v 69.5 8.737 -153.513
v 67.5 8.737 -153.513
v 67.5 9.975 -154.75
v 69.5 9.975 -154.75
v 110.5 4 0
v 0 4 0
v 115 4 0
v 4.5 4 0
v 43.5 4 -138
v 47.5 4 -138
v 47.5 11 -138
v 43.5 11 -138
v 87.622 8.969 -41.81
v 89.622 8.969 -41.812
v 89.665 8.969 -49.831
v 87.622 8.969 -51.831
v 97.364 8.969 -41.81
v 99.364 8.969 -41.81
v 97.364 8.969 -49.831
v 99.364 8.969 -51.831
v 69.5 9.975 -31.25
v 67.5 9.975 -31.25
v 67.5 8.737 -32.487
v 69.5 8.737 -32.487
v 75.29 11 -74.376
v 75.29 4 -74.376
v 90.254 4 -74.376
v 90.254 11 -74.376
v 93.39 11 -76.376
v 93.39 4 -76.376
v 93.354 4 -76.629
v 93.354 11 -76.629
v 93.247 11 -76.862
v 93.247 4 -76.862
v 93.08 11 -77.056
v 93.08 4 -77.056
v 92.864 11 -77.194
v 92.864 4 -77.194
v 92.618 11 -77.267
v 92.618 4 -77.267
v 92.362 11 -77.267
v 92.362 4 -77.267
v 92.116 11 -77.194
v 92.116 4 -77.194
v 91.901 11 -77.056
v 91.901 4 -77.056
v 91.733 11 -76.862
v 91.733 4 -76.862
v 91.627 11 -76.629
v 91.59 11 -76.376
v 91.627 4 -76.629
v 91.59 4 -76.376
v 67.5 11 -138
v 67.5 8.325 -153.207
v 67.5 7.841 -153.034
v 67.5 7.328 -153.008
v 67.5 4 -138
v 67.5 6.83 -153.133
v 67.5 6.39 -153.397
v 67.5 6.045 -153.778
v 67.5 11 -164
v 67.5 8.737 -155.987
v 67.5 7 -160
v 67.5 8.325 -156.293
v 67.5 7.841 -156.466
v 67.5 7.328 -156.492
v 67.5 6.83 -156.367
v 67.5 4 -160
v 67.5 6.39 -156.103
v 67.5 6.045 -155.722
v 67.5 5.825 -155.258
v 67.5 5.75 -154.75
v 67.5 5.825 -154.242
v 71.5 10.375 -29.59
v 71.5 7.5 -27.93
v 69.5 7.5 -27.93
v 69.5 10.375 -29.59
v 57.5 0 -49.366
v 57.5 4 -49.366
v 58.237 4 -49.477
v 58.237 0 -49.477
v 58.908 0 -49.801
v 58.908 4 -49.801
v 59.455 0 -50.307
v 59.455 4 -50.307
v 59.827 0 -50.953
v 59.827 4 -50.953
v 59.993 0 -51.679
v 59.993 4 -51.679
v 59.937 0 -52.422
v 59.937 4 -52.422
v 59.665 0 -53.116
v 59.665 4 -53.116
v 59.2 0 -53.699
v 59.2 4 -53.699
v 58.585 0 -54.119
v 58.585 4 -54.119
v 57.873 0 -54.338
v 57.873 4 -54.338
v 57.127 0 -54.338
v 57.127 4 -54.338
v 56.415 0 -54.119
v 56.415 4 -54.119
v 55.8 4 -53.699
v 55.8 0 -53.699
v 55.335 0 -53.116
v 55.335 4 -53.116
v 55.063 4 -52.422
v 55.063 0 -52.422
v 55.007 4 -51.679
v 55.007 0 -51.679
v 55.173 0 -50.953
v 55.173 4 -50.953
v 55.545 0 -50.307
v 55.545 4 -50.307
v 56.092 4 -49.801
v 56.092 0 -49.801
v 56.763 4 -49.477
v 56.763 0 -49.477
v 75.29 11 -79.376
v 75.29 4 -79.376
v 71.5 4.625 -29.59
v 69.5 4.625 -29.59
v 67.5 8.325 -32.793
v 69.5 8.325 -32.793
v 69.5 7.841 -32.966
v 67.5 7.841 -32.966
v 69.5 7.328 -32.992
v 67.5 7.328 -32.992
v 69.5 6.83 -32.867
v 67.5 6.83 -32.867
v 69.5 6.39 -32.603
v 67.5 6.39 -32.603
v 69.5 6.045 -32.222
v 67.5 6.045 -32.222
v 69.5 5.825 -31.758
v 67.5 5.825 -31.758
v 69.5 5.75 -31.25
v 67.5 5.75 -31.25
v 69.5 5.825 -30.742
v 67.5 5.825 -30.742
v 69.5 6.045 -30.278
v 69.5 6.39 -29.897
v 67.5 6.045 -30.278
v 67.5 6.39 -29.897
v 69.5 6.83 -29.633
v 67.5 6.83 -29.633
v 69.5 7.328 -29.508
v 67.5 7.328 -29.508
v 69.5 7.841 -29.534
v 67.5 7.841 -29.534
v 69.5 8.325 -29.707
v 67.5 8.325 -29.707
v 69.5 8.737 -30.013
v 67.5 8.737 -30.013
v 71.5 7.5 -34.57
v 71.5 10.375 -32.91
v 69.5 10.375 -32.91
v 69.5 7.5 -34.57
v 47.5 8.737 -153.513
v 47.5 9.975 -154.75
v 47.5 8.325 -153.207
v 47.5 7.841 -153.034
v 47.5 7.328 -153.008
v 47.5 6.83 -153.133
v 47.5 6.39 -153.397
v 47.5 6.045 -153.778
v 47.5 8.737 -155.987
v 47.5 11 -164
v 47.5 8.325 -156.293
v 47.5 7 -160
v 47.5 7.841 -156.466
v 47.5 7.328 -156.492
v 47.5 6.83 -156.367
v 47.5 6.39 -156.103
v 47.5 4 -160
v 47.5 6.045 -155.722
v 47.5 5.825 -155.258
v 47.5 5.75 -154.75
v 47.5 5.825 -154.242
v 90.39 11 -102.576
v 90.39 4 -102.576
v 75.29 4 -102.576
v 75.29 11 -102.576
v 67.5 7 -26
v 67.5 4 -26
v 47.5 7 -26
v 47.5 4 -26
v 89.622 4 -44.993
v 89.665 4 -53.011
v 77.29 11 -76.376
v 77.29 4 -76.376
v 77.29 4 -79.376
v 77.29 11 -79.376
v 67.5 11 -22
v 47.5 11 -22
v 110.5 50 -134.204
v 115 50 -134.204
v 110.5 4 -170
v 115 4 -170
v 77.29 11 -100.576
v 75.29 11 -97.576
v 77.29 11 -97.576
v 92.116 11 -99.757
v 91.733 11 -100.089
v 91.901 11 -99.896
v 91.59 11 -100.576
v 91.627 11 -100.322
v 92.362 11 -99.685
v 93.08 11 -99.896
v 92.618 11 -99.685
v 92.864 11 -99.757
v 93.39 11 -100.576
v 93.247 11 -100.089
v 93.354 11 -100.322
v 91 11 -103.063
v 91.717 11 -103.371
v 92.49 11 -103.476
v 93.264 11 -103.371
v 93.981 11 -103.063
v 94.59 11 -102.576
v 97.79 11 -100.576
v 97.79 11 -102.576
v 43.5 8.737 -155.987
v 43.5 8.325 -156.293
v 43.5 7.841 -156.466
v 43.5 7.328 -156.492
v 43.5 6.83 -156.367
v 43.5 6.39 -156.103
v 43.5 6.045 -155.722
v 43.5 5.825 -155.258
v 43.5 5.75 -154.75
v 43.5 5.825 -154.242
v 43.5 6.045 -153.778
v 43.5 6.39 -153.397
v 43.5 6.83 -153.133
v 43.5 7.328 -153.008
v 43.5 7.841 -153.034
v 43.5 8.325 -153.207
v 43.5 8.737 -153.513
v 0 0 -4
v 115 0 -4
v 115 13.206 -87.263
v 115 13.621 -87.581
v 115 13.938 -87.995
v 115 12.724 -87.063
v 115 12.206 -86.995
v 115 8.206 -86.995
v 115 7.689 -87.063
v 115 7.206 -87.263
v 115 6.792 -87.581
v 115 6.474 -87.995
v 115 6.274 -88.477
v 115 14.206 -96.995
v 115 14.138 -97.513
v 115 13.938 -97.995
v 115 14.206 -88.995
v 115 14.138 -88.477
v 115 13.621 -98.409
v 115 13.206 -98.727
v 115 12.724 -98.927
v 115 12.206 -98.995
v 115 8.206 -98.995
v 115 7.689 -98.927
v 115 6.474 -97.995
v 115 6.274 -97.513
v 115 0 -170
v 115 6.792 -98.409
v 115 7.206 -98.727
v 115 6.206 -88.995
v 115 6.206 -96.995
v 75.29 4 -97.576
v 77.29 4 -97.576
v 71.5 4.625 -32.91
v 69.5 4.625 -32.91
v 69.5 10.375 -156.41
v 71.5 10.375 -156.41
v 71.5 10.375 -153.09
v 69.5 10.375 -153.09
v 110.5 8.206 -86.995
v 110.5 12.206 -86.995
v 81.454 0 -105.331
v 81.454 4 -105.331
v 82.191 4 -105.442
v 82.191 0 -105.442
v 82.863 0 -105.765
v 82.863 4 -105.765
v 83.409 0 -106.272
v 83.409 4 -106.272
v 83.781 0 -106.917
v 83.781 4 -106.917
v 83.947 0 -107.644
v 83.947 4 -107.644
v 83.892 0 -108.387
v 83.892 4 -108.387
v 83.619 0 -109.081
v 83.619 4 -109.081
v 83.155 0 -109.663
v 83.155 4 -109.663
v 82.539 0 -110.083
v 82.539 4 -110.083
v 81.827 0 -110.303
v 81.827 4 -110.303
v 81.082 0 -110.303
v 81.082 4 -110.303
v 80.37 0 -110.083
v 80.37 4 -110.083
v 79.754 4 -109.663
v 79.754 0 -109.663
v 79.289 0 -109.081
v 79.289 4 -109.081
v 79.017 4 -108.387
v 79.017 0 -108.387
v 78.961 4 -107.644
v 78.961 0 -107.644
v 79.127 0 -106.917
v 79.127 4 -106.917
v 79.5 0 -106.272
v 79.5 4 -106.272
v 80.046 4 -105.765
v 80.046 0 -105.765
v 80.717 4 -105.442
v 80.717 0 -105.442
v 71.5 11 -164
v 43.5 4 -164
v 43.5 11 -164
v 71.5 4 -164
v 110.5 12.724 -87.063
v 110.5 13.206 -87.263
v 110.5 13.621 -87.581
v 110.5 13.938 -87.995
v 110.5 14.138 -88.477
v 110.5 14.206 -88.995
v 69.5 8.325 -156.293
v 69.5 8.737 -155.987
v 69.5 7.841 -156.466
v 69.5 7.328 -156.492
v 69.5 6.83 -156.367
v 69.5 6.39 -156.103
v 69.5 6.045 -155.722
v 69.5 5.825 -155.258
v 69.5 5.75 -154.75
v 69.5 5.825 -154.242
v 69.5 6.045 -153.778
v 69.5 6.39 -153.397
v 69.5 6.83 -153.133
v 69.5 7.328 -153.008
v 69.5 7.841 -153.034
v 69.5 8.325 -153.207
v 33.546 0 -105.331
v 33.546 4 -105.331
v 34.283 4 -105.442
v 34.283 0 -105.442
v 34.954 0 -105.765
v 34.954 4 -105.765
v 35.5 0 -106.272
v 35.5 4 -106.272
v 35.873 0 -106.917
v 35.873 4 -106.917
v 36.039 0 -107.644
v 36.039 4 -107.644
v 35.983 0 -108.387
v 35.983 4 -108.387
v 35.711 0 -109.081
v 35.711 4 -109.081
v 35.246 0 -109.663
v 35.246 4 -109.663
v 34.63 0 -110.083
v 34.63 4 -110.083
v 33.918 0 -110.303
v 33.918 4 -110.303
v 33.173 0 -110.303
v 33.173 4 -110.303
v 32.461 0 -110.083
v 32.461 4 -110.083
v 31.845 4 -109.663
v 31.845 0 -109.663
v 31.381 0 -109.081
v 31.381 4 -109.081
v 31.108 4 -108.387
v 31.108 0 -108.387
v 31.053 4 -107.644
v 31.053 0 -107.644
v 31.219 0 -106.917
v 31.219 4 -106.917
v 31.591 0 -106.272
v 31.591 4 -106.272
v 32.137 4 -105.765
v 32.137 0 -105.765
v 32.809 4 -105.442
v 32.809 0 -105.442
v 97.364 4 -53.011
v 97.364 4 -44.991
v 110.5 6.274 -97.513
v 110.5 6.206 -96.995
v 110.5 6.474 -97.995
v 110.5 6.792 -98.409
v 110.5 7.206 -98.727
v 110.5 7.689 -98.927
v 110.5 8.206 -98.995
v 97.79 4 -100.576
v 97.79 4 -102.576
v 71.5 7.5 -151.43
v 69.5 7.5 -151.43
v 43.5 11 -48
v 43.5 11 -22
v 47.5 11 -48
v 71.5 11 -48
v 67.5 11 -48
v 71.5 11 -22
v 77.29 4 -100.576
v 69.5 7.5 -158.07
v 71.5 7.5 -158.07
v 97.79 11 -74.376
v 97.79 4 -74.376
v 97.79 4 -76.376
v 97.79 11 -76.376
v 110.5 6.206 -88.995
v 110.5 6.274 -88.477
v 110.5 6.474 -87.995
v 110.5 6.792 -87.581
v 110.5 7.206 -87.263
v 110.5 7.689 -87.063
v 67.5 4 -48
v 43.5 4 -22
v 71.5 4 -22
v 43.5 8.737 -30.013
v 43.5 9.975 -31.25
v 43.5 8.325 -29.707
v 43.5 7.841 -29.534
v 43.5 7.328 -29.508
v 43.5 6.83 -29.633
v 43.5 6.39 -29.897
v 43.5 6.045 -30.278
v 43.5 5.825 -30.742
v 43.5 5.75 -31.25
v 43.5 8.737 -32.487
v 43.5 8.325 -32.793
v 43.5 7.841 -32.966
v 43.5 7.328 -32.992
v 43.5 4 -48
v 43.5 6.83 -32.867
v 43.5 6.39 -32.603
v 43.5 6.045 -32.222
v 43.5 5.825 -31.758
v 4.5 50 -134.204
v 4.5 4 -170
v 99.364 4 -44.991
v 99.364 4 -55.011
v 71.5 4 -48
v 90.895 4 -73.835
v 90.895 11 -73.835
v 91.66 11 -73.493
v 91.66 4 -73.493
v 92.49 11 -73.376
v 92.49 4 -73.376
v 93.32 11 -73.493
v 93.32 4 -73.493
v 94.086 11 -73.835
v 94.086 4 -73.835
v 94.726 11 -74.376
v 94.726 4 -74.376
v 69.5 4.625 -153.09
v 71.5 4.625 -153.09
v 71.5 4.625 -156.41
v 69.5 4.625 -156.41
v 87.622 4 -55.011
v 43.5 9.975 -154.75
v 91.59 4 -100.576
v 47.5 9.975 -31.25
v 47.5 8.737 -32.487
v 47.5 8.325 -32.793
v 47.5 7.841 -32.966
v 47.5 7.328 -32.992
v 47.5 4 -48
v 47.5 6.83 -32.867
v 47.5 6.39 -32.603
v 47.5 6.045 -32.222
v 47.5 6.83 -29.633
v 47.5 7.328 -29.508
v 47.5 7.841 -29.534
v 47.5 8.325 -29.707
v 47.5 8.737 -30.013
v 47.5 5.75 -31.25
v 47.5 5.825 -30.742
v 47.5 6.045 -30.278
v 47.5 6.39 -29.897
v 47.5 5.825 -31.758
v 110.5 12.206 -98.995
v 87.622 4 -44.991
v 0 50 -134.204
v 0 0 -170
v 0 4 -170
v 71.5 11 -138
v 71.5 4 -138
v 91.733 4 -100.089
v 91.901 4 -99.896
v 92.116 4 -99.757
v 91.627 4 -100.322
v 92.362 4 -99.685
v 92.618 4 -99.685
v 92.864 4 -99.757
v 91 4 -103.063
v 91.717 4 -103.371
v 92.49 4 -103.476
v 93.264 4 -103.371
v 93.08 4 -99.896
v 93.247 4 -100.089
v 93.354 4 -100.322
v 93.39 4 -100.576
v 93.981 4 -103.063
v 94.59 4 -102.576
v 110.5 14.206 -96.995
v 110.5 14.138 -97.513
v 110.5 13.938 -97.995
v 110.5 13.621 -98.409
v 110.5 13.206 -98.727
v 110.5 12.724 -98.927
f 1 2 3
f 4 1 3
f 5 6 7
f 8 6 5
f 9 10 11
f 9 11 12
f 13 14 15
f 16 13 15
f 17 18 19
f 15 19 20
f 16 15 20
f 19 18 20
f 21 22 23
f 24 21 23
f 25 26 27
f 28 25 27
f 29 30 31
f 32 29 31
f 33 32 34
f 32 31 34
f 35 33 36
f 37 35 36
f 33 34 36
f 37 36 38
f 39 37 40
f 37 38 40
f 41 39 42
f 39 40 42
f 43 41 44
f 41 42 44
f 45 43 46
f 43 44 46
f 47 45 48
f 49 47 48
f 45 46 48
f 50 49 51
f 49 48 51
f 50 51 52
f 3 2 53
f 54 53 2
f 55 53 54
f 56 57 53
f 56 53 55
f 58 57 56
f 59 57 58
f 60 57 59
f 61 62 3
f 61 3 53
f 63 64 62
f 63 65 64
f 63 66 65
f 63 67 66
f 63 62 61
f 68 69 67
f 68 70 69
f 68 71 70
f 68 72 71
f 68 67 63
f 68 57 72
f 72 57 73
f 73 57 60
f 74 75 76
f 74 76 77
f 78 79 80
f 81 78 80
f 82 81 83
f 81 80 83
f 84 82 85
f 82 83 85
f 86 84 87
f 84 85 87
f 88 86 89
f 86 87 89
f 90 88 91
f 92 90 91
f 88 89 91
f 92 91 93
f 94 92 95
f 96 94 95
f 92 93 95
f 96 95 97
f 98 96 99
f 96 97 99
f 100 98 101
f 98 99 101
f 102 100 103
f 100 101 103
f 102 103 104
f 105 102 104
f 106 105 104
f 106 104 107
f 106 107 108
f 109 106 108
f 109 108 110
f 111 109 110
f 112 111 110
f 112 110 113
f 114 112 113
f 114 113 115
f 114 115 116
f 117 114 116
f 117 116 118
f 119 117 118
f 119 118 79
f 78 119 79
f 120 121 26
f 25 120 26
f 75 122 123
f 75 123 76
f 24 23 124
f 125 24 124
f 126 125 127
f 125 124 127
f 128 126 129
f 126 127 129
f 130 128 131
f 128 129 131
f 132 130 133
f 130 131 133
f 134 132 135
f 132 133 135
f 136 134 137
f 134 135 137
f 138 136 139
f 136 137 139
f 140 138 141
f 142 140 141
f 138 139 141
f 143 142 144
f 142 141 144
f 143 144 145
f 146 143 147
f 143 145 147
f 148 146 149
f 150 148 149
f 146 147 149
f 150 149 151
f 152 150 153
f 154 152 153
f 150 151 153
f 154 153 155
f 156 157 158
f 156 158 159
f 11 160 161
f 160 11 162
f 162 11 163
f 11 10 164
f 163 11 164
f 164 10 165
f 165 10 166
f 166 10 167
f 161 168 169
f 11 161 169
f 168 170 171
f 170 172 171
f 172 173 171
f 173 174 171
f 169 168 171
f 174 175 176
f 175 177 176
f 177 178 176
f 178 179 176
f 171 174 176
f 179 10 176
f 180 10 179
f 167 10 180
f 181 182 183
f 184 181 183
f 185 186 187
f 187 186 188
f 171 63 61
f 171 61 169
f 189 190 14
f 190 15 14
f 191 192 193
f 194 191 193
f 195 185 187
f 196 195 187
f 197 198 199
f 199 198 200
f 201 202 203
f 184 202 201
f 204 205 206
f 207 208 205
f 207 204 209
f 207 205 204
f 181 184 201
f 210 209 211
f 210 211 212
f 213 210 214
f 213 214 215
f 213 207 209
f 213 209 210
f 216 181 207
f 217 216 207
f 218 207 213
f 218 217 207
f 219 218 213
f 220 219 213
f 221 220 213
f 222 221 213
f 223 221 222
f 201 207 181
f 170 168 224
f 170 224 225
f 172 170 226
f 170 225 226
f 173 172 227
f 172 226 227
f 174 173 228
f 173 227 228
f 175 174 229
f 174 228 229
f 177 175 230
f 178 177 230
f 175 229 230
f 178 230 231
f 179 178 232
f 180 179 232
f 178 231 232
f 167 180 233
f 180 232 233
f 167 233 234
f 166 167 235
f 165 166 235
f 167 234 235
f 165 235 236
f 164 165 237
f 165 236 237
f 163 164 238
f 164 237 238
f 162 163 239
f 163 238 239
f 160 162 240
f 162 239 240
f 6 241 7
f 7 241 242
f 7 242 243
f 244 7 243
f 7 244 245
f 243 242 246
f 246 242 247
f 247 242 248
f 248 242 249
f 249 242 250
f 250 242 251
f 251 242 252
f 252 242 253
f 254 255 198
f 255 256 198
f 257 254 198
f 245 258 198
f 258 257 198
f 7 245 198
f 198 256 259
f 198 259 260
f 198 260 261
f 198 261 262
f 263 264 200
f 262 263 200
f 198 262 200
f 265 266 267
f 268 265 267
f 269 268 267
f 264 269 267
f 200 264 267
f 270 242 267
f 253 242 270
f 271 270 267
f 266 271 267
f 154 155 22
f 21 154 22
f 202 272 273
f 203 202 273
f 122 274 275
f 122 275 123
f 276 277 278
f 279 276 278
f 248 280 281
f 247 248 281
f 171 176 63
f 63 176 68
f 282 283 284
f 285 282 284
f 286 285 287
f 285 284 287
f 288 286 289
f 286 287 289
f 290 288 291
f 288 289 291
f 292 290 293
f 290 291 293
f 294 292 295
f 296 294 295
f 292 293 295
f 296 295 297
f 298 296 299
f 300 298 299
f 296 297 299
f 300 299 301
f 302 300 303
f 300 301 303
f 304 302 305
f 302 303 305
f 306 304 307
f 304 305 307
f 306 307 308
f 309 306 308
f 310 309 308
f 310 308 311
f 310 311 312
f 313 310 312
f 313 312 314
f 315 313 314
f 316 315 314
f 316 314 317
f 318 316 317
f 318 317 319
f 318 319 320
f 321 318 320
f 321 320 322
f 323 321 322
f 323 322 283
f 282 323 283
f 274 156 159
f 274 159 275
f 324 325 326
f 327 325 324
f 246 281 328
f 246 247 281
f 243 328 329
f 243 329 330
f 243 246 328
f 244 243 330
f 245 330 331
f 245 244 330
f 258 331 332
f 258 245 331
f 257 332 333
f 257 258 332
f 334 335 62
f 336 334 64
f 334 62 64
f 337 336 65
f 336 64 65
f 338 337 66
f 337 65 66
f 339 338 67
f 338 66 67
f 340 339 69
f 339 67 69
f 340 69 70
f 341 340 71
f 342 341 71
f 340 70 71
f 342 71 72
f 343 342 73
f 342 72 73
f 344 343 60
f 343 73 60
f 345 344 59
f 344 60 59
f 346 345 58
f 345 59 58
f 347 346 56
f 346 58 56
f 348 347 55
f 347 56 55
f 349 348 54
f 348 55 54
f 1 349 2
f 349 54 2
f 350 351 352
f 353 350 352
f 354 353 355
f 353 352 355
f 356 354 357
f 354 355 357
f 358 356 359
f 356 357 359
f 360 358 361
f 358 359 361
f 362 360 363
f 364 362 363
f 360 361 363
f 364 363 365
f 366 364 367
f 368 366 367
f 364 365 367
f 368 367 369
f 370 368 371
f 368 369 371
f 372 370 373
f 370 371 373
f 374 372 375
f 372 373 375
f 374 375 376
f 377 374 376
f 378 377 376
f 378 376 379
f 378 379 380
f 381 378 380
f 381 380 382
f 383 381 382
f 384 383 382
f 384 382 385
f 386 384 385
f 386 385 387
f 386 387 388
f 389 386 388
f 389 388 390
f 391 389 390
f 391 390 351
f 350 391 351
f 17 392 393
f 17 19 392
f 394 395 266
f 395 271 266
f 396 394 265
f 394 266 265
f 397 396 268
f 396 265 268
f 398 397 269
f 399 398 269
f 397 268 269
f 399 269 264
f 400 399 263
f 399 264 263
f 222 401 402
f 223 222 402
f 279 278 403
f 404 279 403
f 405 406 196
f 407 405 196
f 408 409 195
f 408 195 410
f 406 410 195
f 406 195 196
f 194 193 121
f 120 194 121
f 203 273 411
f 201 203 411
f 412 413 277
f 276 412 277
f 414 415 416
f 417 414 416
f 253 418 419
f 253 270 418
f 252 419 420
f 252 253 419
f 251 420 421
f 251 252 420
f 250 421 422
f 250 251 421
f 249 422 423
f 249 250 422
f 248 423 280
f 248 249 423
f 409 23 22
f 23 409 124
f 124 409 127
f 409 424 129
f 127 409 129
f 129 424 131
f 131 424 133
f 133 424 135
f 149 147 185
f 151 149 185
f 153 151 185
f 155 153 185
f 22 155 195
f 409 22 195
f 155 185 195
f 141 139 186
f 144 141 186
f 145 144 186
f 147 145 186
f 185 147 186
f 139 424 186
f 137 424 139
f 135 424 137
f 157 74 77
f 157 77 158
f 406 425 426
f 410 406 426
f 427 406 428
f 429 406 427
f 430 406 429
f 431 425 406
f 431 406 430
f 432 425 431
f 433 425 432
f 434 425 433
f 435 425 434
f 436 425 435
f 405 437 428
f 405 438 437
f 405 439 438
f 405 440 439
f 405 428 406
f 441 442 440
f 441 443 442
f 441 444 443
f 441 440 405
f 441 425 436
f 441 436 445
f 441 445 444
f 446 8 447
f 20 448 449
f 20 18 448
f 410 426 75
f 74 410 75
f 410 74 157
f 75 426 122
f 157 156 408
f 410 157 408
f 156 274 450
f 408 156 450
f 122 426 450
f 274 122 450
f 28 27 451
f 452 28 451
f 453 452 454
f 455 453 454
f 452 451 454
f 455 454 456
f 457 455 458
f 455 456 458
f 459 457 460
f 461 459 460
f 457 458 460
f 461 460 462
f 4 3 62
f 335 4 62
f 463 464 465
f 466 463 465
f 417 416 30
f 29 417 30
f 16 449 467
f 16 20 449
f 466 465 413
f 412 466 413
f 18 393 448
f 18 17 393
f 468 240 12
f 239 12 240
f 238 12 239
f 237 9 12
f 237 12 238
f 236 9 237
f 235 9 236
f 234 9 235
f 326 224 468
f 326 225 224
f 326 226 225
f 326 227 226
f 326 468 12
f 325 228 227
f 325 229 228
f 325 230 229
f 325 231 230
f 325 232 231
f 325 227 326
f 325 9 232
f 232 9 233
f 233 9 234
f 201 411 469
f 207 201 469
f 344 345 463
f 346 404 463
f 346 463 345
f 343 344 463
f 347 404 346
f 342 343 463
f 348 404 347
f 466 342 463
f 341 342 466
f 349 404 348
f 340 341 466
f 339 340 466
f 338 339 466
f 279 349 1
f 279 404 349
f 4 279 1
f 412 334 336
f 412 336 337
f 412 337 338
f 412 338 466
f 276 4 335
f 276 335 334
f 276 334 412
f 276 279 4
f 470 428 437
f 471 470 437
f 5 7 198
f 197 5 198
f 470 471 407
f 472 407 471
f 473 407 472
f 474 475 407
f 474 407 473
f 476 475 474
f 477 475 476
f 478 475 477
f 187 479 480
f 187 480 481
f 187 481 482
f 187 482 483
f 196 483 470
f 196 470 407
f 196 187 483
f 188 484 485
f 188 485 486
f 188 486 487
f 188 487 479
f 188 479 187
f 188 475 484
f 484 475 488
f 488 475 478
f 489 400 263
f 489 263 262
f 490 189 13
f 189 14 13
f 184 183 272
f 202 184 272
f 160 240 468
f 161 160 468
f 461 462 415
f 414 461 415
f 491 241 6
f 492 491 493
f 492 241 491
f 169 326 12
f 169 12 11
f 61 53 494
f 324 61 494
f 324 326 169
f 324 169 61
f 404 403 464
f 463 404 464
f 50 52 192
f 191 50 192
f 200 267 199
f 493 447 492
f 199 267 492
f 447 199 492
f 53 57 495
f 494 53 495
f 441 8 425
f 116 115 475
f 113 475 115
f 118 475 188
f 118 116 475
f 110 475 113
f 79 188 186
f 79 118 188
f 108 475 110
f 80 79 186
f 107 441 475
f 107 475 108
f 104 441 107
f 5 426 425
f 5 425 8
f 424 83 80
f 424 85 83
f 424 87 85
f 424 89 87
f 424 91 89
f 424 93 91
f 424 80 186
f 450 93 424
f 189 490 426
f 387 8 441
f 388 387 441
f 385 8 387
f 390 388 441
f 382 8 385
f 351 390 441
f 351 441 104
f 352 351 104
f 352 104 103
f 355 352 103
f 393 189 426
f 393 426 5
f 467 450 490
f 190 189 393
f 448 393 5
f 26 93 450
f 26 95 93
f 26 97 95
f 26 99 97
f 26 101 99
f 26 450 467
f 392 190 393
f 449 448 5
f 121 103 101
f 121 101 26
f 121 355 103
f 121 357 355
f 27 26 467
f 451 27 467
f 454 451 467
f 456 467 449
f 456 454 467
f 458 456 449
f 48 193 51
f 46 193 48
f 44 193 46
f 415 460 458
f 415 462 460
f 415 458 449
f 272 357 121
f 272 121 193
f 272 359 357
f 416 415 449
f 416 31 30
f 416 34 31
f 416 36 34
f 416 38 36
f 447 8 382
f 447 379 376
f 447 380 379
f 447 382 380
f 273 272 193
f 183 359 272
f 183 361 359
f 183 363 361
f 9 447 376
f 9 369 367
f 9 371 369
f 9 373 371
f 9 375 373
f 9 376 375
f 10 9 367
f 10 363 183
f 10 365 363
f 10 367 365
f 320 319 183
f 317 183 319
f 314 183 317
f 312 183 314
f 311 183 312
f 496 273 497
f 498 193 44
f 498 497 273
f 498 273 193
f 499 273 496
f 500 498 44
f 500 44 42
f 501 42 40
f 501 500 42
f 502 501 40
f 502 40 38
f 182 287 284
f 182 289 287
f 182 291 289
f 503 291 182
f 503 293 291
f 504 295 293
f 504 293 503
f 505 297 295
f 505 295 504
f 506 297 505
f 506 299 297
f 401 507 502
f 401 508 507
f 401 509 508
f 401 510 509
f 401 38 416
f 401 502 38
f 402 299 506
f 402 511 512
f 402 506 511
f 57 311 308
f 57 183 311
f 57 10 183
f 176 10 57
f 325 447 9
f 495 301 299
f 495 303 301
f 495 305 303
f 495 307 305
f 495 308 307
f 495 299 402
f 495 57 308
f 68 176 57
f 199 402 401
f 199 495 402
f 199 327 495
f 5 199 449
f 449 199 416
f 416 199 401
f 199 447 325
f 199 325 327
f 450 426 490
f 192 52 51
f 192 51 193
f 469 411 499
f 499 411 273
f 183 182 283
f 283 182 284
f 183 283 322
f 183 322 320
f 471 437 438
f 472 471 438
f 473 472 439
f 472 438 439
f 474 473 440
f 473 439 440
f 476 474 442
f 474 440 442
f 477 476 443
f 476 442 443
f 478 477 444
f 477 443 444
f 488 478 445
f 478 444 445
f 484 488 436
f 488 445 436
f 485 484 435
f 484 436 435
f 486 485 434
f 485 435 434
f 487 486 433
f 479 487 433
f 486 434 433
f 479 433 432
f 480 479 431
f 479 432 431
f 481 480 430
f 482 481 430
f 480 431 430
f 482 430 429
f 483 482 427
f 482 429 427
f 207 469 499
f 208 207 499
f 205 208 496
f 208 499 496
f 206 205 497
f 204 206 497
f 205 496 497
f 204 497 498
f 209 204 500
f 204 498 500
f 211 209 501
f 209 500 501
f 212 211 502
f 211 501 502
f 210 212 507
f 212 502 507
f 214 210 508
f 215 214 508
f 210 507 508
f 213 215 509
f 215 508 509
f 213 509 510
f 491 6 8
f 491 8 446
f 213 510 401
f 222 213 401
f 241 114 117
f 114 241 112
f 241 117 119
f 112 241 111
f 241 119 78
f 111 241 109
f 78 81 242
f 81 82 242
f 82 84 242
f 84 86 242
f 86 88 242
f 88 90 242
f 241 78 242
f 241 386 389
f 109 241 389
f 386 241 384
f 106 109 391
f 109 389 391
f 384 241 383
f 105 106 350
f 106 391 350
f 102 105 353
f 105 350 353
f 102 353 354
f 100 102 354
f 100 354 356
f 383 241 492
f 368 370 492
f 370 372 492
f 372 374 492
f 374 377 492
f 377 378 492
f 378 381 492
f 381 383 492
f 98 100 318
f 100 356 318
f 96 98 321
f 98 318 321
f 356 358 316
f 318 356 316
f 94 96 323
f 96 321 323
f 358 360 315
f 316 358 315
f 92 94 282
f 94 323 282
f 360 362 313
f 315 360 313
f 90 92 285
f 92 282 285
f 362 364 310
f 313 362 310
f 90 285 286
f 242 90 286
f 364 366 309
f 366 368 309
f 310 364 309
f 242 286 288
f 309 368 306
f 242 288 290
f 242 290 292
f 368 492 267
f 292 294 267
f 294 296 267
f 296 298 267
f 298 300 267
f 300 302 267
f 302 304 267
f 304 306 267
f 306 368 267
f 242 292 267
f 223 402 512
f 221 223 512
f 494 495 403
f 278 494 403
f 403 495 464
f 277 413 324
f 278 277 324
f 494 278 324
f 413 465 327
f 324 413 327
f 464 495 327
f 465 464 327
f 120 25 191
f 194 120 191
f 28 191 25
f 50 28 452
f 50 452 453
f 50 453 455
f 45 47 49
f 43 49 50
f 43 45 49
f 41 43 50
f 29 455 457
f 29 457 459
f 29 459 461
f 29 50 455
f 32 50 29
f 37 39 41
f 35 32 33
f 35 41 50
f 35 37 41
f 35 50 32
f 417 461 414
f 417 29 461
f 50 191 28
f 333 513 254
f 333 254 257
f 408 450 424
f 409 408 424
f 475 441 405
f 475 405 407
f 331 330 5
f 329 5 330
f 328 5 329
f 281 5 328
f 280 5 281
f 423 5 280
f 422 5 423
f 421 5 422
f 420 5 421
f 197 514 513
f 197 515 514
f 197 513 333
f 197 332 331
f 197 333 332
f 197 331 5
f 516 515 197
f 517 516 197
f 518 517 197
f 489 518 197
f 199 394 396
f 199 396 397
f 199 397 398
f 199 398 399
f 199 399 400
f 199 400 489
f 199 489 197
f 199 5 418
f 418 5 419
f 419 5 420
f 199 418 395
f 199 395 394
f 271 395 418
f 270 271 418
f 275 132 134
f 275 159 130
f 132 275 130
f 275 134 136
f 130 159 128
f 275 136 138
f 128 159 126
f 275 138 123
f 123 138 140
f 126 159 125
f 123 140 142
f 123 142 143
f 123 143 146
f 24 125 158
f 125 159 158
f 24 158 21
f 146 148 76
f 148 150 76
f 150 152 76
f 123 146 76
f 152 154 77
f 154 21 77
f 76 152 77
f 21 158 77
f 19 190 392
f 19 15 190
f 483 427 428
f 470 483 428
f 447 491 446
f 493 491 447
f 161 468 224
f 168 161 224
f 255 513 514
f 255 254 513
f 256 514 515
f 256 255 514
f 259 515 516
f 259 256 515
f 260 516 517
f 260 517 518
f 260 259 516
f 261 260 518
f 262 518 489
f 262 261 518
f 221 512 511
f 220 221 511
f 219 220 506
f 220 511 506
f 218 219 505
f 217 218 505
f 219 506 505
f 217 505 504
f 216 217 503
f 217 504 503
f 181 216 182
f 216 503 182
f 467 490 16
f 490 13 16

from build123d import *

# Parameters (mm, degrees)
SKETCH1_W                  = 110.5
SKETCH1_H                  = 170
SKETCH1_W_2                = 4.5
BOSS_EXTRUDE1_DEPTH        = 4
SKETCH1_4_W                = 4.5
SKETCH1_4_H                = 170
BOSS_EXTRUDE2_DEPTH        = 50
CUT_EXTRUDE1_DEPTH         = 4.5
SALIENTE_EXTRUIR1_DEPTH    = 7
SALIENTE_EXTRUIR2_DEPTH    = 7
CORTAR_EXTRUIR1_DEPTH      = 31
CORTAR_EXTRUIR1_DEPTH_BACK = 7
CORTAR_EXTRUIR2_DEPTH      = 2
CHAFL_N1_SIZE              = 4
CHAFL_N2_SIZE              = 4
CROQUIS5_R                 = 2.5
CORTAR_EXTRUIR3_DEPTH      = 23.7
CHAFL_N3_SIZE              = 4
SALIENTE_EXTRUIR4_DEPTH    = 7
CROQUIS8_W                 = 12
CROQUIS8_H                 = 8
CORTAR_EXTRUIR4_DEPTH      = 7
REDONDEO1_R                = 2


with BuildPart() as part:
    # Sketch1 → Boss-Extrude1 (new body)
    with BuildSketch(Plane(origin=(0, 0, 0), x_dir=(1, 0, 0), z_dir=(0, 1, 0))):
        with Locations((59.75, 85)):
            Rectangle(SKETCH1_W, SKETCH1_H)
        with Locations((2.25, 85)):
            Rectangle(SKETCH1_W_2, SKETCH1_H)
    extrude(amount=BOSS_EXTRUDE1_DEPTH)

    # Sketch1<4> → Boss-Extrude2 (add)
    with BuildSketch(Plane(origin=(0, 0, 0), x_dir=(1, 0, 0), z_dir=(0, 1, 0))):
        with Locations((2.25, 85)):
            Rectangle(SKETCH1_4_W, SKETCH1_4_H)
    boss_extrude2 = extrude(amount=BOSS_EXTRUDE2_DEPTH)

    # Sketch2 → Cut-Extrude1 (cut)
    with BuildSketch(Plane.ZY):
        Polygon((-134.204014838, 50), (-170, 4), (-182.392562203, 4), (-182.392562203, 57.402643918), (5.745866014, 57.402643918), (5.745866014, 4), (0, 4), align=None)
    cut_extrude1 = extrude(amount=-CUT_EXTRUDE1_DEPTH, mode=Mode.SUBTRACT)

    # Mirror1: Boss-Extrude2, Cut-Extrude1 across plane
    add(boss_extrude2.mirror(Plane(origin=(57.5, 0, 0), x_dir=(0, 0, 1), z_dir=(1, 0, 0))))
    add(cut_extrude1.mirror(Plane(origin=(57.5, 0, 0), x_dir=(0, 0, 1), z_dir=(1, 0, 0))), mode=Mode.SUBTRACT)

    # Sketch3 → Saliente-Extruir1 (add)
    with BuildSketch(Plane(origin=(0, 4, 0), x_dir=(1, 0, 0), z_dir=(0, 1, 0))):
        Polygon((57.5, 160), (47.5, 160), (47.5, 142), (47.5, 138), (43.5, 138), (43.5, 164), (57.5, 164), align=None)
    saliente_extruir1 = extrude(amount=SALIENTE_EXTRUIR1_DEPTH)

    # Croquis1 → Saliente-Extruir2 (add)
    with BuildSketch(Plane(origin=(0, 4, 0), x_dir=(1, 0, 0), z_dir=(0, 1, 0))):
        Polygon((57.5, 26), (57.5, 22), (43.5, 22), (43.5, 48), (47.5, 48), (47.5, 26), align=None)
    saliente_extruir2 = extrude(amount=SALIENTE_EXTRUIR2_DEPTH)

    # Simetría1: Saliente-Extruir1, Saliente-Extruir2 across plane
    add(saliente_extruir1.mirror(Plane(origin=(57.5, 11, -164), x_dir=(0, 0, 1), z_dir=(-1, 0, 0))))
    add(saliente_extruir2.mirror(Plane(origin=(57.5, 11, -164), x_dir=(0, 0, 1), z_dir=(-1, 0, 0))))

    # Croquis2 → Cortar-Extruir1 (cut, two sides: drawn at the far end of the back side and taken through both)
    with BuildSketch(Plane(origin=(47.5, 0, 0), x_dir=(0, 0, -1), z_dir=(1, 0, 0)).offset(-CORTAR_EXTRUIR1_DEPTH_BACK)):
        with BuildLine():
            Line((31.25, 9.974873734), (32.487436867, 8.737436867))
            ThreePointArc((32.487436867, 8.737436867), (31.25, 5.75), (30.012563133, 8.737436867))
            Line((30.012563133, 8.737436867), (31.25, 9.974873734))
        make_face()
        with BuildLine():
            Line((154.75, 9.974873734), (155.987436867, 8.737436867))
            ThreePointArc((155.987436867, 8.737436867), (154.75, 5.75), (153.512563133, 8.737436867))
            Line((153.512563133, 8.737436867), (154.75, 9.974873734))
        make_face()
    extrude(amount=CORTAR_EXTRUIR1_DEPTH + CORTAR_EXTRUIR1_DEPTH_BACK, mode=Mode.SUBTRACT)

    # Croquis4 → Cortar-Extruir2 (cut)
    with BuildSketch(Plane(origin=(71.5, 0, 0), x_dir=(0, 0, -1), z_dir=(1, 0, 0))):
        Polygon((158.069764048, 7.5), (156.409882024, 10.375), (153.090117976, 10.375), (151.430235952, 7.5), (153.090117976, 4.625), (156.409882024, 4.625), align=None)
        Polygon((29.590117976, 4.625), (27.930235952, 7.5), (29.590117976, 10.375), (32.909882024, 10.375), (34.569764048, 7.5), (32.909882024, 4.625), align=None)
    extrude(amount=-CORTAR_EXTRUIR2_DEPTH, mode=Mode.SUBTRACT)

    # Chaflán1
    chafl_n1_edges = [part.edges().sort_by_distance(p)[0] for p in [
        (57.5, 11, -26),
    ]]
    chamfer(chafl_n1_edges, length=CHAFL_N1_SIZE - 0.0001)  # a hair under: the kernel refuses the full size

    # Chaflán2
    chafl_n2_edges = [part.edges().sort_by_distance(p)[0] for p in [
        (57.5, 11, -160),
    ]]
    chamfer(chafl_n2_edges, length=CHAFL_N2_SIZE - 0.0001)  # a hair under: the kernel refuses the full size

    # Croquis5 → Cortar-Extruir3 (cut)
    with BuildSketch(Plane(origin=(0, 4, 0), x_dir=(1, 0, 0), z_dir=(0, 1, 0))):
        with Locations(Location((33.545716199, 107.830838948, 0), (0, 0, 270))):
            Circle(CROQUIS5_R)
        with Locations(Location((57.5, 51.866184435, 0), (0, 0, 270))):
            Circle(CROQUIS5_R)
        with Locations(Location((81.454283801, 107.830838948, 0), (0, 0, 270))):
            Circle(CROQUIS5_R)
    extrude(amount=-CORTAR_EXTRUIR3_DEPTH, mode=Mode.SUBTRACT)

    # Chaflán3
    chafl_n3_edges = [part.edges().sort_by_distance(p)[0] for p in [
        (57.5, 0, 0),
    ]]
    chamfer(chafl_n3_edges, length=CHAFL_N3_SIZE - 0.0001)  # a hair under: the kernel refuses the full size

    # Saliente-Extruir3: read off the stored shape, not the designer's step
    # Saliente-Extruir3: loft between two sections, ruled curve by curve
    saliente_extruir3_from = [
        Edge.make_line((89.622165017, 4, -44.992823986), (87.622165017, 4, -44.990685532)),
        Edge.make_line((89.66503142, 4, -53.010916957), (89.622165017, 4, -44.992823986)),
        Edge.make_line((89.66503142, 4, -53.010916957), (97.363741989, 4, -53.010916957)),
        Edge.make_line((97.363741989, 4, -53.010916957), (97.363741989, 4, -44.990685532)),
        Edge.make_line((97.363741989, 4, -44.990685532), (99.363741989, 4, -44.990685532)),
        Edge.make_line((99.363741989, 4, -44.990685532), (99.363741989, 4, -55.010916957)),
        Edge.make_line((99.363741989, 4, -55.010916957), (87.622165017, 4, -55.010916957)),
        Edge.make_line((87.622165017, 4, -44.990685532), (87.622165017, 4, -55.010916957)),
    ]
    saliente_extruir3_to = [
        Edge.make_line((89.622165017, 8.969440836, -41.812469009), (87.622165017, 8.969440836, -41.810330556)),
        Edge.make_line((89.66503142, 8.969440836, -49.83056198), (89.622165017, 8.969440836, -41.812469009)),
        Edge.make_line((89.66503142, 8.969440836, -49.83056198), (97.363741989, 8.969440836, -49.83056198)),
        Edge.make_line((97.363741989, 8.969440836, -49.83056198), (97.363741989, 8.969440836, -41.810330556)),
        Edge.make_line((97.363741989, 8.969440836, -41.810330556), (99.363741989, 8.969440836, -41.810330556)),
        Edge.make_line((99.363741989, 8.969440836, -41.810330556), (99.363741989, 8.969440836, -51.83056198)),
        Edge.make_line((99.363741989, 8.969440836, -51.83056198), (87.622165017, 8.969440836, -51.83056198)),
        Edge.make_line((87.622165017, 8.969440836, -41.810330556), (87.622165017, 8.969440836, -51.83056198)),
    ]
    saliente_extruir3 = Solid(Shell([*[Face.make_surface_from_curves(saliente_extruir3_from[k], saliente_extruir3_to[k]) for k in range(8)], Face(Wire(saliente_extruir3_from)), Face(Wire(saliente_extruir3_to))]))
    add(saliente_extruir3)

    # Croquis7 → Saliente-Extruir4 (add)
    with BuildSketch(Plane(origin=(0, 4, 0), x_dir=(1, 0, 0), z_dir=(0, 1, 0))):
        with BuildLine():
            Line((93.557674933, 100.575775557), (95.79024416, 100.575775557))
            Line((95.79024416, 100.575775557), (97.79024416, 100.575775557))
            Line((97.79024416, 100.575775557), (97.79024416, 102.575775557))
            Line((97.79024416, 102.575775557), (94.59024416, 102.575775557))
            ThreePointArc((94.59024416, 102.575775557), (92.49024416, 103.475775557), (90.39024416, 102.575775557))
            Line((90.39024416, 102.575775557), (75.29024416, 102.575775557))
            Line((75.29024416, 102.575775557), (75.29024416, 97.575775557))
            Line((75.29024416, 97.575775557), (77.29024416, 97.575775557))
            Line((77.29024416, 97.575775557), (77.29024416, 100.575775557))
            Line((77.29024416, 100.575775557), (80.20924649, 100.575775557))
            Line((80.20924649, 100.575775557), (91.59024416, 100.575775557))
            ThreePointArc((91.59024416, 100.575775557), (92.49024416, 99.675775557), (93.39024416, 100.575775557))
            Line((93.39024416, 100.575775557), (93.557674933, 100.575775557))
        make_face()
        with BuildLine():
            Line((94.726312137, 74.375775557), (97.79024416, 74.375775557))
            Line((97.79024416, 74.375775557), (97.79024416, 76.375775557))
            Line((97.79024416, 76.375775557), (95.79024416, 76.375775557))
            Line((95.79024416, 76.375775557), (93.39024416, 76.375775557))
            ThreePointArc((93.39024416, 76.375775557), (92.49024416, 77.275775557), (91.59024416, 76.375775557))
            Line((91.59024416, 76.375775557), (83.611986998, 76.375775557))
            Line((83.611986998, 76.375775557), (77.29024416, 76.375775557))
            Line((77.29024416, 76.375775557), (77.29024416, 79.375775557))
            Line((77.29024416, 79.375775557), (75.29024416, 79.375775557))
            Line((75.29024416, 79.375775557), (75.29024416, 74.375775557))
            Line((75.29024416, 74.375775557), (90.254176182, 74.375775557))
            ThreePointArc((90.254176182, 74.375775557), (92.49024416, 73.375775557), (94.726312137, 74.375775557))
        make_face()
    extrude(amount=SALIENTE_EXTRUIR4_DEPTH)

    # Croquis8 → Cortar-Extruir4 (cut)
    with BuildSketch(Plane.ZY.offset(-110.5)):
        with Locations((-92.994977689, 10.20633678)):
            Rectangle(CROQUIS8_W, CROQUIS8_H)
    extrude(amount=-CORTAR_EXTRUIR4_DEPTH, mode=Mode.SUBTRACT)

    # Redondeo1
    redondeo1_edges = [part.edges().sort_by_distance(p)[0] for p in [
        (112.75, 14.20633678, -98.994977689),
        (112.75, 14.20633678, -86.994977689),
        (112.75, 6.20633678, -86.994977689),
        (112.75, 6.20633678, -98.994977689),
    ]]
    fillet(redondeo1_edges, radius=REDONDEO1_R)


solid = part.part
